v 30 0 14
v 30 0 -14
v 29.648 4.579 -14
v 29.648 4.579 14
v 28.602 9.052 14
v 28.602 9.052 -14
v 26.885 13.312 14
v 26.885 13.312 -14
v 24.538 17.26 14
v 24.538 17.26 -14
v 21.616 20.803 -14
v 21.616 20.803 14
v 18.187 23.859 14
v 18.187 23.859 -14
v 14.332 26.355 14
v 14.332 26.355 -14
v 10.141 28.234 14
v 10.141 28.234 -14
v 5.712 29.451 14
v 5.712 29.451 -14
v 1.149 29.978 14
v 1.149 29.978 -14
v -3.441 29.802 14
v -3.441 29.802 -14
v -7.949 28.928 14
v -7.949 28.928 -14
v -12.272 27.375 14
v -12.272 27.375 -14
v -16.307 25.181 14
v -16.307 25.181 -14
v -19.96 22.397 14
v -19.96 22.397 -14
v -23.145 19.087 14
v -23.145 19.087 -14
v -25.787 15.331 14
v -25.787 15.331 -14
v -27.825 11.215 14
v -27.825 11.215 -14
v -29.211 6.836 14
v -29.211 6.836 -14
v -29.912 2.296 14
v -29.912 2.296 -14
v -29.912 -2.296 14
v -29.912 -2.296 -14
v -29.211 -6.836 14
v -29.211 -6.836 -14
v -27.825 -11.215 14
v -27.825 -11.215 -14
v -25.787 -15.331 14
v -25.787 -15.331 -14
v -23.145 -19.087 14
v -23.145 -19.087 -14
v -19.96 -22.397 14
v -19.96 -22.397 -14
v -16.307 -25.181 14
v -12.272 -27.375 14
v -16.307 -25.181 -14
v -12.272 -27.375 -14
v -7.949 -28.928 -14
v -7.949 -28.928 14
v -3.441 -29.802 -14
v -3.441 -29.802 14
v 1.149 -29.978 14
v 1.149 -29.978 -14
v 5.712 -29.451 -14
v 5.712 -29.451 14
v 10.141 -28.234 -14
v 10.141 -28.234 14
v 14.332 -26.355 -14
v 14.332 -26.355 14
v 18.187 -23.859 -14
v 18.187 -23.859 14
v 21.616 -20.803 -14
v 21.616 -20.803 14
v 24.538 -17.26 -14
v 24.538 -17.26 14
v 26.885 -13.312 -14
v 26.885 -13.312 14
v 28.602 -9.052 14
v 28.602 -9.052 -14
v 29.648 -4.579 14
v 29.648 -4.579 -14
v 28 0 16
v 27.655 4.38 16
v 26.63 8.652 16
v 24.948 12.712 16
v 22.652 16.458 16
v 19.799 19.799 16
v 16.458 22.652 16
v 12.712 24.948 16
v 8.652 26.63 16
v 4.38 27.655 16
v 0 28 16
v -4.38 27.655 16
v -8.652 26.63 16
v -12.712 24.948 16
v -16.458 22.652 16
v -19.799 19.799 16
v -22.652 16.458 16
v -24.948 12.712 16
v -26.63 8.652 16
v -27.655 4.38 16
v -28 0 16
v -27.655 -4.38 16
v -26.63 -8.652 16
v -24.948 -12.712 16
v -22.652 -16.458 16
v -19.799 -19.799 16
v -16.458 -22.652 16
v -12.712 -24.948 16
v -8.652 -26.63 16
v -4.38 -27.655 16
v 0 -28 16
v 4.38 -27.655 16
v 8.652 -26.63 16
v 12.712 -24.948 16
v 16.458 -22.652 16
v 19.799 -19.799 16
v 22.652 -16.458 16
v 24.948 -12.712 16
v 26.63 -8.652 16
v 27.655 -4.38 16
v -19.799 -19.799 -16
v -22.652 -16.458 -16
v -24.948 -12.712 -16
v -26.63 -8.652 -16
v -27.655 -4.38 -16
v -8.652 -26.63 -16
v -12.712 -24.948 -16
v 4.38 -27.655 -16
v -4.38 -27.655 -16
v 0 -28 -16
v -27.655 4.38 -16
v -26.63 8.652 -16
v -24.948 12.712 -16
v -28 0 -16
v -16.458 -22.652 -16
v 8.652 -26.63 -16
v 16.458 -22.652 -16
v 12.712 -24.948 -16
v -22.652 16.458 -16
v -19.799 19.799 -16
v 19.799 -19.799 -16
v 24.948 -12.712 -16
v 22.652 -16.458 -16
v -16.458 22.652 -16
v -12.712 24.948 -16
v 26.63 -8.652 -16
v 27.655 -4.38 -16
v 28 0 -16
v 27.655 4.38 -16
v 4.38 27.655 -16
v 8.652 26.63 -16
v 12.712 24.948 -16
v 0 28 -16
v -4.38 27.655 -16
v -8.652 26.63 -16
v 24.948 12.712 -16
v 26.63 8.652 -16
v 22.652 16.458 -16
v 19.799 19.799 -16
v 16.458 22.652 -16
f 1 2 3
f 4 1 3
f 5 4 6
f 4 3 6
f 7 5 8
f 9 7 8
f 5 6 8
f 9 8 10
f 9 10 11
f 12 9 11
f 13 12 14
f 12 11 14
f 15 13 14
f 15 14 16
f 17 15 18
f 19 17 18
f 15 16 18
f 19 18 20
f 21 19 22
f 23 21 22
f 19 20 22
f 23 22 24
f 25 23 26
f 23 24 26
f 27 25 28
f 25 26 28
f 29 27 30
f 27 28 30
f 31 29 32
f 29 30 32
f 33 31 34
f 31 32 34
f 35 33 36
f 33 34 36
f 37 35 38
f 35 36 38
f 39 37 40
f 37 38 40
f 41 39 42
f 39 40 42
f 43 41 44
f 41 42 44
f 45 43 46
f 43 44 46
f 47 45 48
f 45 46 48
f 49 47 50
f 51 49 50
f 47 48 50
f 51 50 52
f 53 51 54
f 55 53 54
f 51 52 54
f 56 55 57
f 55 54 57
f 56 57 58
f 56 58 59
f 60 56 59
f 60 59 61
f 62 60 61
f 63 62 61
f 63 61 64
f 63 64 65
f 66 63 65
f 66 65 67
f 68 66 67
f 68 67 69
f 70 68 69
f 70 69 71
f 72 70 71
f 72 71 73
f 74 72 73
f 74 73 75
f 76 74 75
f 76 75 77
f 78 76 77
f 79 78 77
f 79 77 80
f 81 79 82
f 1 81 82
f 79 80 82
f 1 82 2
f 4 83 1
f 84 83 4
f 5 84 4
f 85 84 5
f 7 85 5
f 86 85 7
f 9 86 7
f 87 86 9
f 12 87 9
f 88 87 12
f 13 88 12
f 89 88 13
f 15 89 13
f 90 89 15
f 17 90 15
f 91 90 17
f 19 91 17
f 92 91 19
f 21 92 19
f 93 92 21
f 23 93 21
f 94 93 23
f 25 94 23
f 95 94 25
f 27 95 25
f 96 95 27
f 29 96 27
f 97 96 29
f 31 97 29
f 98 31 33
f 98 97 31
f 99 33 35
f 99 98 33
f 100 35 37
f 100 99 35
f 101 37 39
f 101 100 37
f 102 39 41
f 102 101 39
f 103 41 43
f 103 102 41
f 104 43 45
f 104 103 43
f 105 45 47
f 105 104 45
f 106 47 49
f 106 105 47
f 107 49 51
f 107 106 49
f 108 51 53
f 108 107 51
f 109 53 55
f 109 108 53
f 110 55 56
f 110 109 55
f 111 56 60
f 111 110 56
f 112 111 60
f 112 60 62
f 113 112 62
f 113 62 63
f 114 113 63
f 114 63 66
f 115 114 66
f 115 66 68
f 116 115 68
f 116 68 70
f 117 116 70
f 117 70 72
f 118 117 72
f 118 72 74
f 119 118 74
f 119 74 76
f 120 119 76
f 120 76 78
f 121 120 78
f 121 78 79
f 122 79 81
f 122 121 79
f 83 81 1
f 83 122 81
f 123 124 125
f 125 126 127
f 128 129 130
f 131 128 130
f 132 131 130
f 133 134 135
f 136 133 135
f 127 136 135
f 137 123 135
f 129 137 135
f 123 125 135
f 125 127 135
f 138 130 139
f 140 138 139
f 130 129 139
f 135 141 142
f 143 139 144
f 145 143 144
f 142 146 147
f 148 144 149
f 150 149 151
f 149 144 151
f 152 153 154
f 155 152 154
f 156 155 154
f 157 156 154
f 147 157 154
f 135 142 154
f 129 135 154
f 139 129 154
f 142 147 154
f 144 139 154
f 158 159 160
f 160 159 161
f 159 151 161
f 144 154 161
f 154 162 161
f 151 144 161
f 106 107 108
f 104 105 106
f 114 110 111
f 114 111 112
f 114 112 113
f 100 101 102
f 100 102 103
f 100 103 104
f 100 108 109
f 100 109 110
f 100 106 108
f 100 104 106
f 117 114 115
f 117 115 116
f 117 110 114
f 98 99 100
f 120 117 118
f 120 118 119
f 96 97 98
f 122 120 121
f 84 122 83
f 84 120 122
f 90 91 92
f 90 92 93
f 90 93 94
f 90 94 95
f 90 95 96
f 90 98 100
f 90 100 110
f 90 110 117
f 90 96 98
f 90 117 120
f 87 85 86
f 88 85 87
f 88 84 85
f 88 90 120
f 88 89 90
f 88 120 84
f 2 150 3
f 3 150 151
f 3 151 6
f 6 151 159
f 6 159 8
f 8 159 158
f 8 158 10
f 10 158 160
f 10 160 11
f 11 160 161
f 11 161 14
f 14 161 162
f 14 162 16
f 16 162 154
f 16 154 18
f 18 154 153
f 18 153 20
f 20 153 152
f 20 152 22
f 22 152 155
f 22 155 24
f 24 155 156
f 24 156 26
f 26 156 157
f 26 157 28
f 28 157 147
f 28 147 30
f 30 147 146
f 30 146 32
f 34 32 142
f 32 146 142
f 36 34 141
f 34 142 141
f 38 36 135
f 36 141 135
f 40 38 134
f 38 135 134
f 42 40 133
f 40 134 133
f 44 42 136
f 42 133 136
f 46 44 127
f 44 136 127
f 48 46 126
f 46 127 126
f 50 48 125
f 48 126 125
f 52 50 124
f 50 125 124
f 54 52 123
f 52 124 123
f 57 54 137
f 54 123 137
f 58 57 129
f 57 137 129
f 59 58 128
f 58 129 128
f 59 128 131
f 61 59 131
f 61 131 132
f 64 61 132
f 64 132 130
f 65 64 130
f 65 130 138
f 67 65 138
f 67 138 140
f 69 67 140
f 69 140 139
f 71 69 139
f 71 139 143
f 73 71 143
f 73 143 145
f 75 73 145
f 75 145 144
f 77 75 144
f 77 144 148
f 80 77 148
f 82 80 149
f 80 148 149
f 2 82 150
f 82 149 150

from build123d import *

# Parameters (mm, degrees)
CYLINDER038_R     = 30
CYLINDER038_DEPTH = 32
CHAMFER010_SIZE   = 2
CHAMFER011_SIZE   = 2


with BuildPart() as part:
    # Cylinder038 → Cylinder038 (join)
    with BuildSketch(Plane.XY.offset(-16)):
        Circle(CYLINDER038_R)
    extrude(amount=CYLINDER038_DEPTH)

    # Chamfer010
    chamfer010_edges = [part.edges().sort_by_distance(p)[0] for p in [
        (-30, 0, 16),
    ]]
    chamfer(chamfer010_edges, length=CHAMFER010_SIZE)

    # Chamfer011
    chamfer011_edges = [part.edges().sort_by_distance(p)[0] for p in [
        (-30, 0, -16),
    ]]
    chamfer(chamfer011_edges, length=CHAMFER011_SIZE)


solid = part.part
